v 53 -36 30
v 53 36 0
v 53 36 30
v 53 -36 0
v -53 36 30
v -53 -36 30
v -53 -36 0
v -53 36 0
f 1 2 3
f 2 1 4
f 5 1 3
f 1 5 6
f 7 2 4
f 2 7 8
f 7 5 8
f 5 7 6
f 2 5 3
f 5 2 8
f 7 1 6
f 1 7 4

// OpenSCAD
// Bench rack for 1.5 mL microcentrifuge tubes
// Print orientation: flat on bed, holes open at the top

// ---- Block dimensions ----
block_len   = 106;   // length along X
block_wid   = 72;    // width along Y
block_ht    = 30;    // height along Z

// ---- Hole parameters ----
hole_count  = 24;    // total number of tube holes
hole_d      = 11.2;  // hole diameter
hole_depth  = 25;    // hole depth from the top face
pitch       = 16;    // centre-to-centre spacing (both X and Y)
floor_t     = block_ht - hole_depth; // solid floor thickness (5 mm)

// ---- Cutting overlap ----
eps         = 0.5;   // extension past the top face to avoid coplanar faces

$fn = 96;

difference() {
    // Main block, centred in X and Y, sitting on z = 0
    translate([-block_len / 2, -block_wid / 2, 0])
        cube([block_len, block_wid, block_ht]);

    // Hole grid, centred on the block
    for (i = [0 : hole_count - 1])
        for (j = [0 : (hole_count - 1) / hole_count])
            translate([(i - (hole_count - 1) / 2) * pitch,
                       (j - (hole_count - 1) / 2) * pitch,
                       floor_t])
                cylinder(d = hole_d, h = hole_depth + eps);
}
